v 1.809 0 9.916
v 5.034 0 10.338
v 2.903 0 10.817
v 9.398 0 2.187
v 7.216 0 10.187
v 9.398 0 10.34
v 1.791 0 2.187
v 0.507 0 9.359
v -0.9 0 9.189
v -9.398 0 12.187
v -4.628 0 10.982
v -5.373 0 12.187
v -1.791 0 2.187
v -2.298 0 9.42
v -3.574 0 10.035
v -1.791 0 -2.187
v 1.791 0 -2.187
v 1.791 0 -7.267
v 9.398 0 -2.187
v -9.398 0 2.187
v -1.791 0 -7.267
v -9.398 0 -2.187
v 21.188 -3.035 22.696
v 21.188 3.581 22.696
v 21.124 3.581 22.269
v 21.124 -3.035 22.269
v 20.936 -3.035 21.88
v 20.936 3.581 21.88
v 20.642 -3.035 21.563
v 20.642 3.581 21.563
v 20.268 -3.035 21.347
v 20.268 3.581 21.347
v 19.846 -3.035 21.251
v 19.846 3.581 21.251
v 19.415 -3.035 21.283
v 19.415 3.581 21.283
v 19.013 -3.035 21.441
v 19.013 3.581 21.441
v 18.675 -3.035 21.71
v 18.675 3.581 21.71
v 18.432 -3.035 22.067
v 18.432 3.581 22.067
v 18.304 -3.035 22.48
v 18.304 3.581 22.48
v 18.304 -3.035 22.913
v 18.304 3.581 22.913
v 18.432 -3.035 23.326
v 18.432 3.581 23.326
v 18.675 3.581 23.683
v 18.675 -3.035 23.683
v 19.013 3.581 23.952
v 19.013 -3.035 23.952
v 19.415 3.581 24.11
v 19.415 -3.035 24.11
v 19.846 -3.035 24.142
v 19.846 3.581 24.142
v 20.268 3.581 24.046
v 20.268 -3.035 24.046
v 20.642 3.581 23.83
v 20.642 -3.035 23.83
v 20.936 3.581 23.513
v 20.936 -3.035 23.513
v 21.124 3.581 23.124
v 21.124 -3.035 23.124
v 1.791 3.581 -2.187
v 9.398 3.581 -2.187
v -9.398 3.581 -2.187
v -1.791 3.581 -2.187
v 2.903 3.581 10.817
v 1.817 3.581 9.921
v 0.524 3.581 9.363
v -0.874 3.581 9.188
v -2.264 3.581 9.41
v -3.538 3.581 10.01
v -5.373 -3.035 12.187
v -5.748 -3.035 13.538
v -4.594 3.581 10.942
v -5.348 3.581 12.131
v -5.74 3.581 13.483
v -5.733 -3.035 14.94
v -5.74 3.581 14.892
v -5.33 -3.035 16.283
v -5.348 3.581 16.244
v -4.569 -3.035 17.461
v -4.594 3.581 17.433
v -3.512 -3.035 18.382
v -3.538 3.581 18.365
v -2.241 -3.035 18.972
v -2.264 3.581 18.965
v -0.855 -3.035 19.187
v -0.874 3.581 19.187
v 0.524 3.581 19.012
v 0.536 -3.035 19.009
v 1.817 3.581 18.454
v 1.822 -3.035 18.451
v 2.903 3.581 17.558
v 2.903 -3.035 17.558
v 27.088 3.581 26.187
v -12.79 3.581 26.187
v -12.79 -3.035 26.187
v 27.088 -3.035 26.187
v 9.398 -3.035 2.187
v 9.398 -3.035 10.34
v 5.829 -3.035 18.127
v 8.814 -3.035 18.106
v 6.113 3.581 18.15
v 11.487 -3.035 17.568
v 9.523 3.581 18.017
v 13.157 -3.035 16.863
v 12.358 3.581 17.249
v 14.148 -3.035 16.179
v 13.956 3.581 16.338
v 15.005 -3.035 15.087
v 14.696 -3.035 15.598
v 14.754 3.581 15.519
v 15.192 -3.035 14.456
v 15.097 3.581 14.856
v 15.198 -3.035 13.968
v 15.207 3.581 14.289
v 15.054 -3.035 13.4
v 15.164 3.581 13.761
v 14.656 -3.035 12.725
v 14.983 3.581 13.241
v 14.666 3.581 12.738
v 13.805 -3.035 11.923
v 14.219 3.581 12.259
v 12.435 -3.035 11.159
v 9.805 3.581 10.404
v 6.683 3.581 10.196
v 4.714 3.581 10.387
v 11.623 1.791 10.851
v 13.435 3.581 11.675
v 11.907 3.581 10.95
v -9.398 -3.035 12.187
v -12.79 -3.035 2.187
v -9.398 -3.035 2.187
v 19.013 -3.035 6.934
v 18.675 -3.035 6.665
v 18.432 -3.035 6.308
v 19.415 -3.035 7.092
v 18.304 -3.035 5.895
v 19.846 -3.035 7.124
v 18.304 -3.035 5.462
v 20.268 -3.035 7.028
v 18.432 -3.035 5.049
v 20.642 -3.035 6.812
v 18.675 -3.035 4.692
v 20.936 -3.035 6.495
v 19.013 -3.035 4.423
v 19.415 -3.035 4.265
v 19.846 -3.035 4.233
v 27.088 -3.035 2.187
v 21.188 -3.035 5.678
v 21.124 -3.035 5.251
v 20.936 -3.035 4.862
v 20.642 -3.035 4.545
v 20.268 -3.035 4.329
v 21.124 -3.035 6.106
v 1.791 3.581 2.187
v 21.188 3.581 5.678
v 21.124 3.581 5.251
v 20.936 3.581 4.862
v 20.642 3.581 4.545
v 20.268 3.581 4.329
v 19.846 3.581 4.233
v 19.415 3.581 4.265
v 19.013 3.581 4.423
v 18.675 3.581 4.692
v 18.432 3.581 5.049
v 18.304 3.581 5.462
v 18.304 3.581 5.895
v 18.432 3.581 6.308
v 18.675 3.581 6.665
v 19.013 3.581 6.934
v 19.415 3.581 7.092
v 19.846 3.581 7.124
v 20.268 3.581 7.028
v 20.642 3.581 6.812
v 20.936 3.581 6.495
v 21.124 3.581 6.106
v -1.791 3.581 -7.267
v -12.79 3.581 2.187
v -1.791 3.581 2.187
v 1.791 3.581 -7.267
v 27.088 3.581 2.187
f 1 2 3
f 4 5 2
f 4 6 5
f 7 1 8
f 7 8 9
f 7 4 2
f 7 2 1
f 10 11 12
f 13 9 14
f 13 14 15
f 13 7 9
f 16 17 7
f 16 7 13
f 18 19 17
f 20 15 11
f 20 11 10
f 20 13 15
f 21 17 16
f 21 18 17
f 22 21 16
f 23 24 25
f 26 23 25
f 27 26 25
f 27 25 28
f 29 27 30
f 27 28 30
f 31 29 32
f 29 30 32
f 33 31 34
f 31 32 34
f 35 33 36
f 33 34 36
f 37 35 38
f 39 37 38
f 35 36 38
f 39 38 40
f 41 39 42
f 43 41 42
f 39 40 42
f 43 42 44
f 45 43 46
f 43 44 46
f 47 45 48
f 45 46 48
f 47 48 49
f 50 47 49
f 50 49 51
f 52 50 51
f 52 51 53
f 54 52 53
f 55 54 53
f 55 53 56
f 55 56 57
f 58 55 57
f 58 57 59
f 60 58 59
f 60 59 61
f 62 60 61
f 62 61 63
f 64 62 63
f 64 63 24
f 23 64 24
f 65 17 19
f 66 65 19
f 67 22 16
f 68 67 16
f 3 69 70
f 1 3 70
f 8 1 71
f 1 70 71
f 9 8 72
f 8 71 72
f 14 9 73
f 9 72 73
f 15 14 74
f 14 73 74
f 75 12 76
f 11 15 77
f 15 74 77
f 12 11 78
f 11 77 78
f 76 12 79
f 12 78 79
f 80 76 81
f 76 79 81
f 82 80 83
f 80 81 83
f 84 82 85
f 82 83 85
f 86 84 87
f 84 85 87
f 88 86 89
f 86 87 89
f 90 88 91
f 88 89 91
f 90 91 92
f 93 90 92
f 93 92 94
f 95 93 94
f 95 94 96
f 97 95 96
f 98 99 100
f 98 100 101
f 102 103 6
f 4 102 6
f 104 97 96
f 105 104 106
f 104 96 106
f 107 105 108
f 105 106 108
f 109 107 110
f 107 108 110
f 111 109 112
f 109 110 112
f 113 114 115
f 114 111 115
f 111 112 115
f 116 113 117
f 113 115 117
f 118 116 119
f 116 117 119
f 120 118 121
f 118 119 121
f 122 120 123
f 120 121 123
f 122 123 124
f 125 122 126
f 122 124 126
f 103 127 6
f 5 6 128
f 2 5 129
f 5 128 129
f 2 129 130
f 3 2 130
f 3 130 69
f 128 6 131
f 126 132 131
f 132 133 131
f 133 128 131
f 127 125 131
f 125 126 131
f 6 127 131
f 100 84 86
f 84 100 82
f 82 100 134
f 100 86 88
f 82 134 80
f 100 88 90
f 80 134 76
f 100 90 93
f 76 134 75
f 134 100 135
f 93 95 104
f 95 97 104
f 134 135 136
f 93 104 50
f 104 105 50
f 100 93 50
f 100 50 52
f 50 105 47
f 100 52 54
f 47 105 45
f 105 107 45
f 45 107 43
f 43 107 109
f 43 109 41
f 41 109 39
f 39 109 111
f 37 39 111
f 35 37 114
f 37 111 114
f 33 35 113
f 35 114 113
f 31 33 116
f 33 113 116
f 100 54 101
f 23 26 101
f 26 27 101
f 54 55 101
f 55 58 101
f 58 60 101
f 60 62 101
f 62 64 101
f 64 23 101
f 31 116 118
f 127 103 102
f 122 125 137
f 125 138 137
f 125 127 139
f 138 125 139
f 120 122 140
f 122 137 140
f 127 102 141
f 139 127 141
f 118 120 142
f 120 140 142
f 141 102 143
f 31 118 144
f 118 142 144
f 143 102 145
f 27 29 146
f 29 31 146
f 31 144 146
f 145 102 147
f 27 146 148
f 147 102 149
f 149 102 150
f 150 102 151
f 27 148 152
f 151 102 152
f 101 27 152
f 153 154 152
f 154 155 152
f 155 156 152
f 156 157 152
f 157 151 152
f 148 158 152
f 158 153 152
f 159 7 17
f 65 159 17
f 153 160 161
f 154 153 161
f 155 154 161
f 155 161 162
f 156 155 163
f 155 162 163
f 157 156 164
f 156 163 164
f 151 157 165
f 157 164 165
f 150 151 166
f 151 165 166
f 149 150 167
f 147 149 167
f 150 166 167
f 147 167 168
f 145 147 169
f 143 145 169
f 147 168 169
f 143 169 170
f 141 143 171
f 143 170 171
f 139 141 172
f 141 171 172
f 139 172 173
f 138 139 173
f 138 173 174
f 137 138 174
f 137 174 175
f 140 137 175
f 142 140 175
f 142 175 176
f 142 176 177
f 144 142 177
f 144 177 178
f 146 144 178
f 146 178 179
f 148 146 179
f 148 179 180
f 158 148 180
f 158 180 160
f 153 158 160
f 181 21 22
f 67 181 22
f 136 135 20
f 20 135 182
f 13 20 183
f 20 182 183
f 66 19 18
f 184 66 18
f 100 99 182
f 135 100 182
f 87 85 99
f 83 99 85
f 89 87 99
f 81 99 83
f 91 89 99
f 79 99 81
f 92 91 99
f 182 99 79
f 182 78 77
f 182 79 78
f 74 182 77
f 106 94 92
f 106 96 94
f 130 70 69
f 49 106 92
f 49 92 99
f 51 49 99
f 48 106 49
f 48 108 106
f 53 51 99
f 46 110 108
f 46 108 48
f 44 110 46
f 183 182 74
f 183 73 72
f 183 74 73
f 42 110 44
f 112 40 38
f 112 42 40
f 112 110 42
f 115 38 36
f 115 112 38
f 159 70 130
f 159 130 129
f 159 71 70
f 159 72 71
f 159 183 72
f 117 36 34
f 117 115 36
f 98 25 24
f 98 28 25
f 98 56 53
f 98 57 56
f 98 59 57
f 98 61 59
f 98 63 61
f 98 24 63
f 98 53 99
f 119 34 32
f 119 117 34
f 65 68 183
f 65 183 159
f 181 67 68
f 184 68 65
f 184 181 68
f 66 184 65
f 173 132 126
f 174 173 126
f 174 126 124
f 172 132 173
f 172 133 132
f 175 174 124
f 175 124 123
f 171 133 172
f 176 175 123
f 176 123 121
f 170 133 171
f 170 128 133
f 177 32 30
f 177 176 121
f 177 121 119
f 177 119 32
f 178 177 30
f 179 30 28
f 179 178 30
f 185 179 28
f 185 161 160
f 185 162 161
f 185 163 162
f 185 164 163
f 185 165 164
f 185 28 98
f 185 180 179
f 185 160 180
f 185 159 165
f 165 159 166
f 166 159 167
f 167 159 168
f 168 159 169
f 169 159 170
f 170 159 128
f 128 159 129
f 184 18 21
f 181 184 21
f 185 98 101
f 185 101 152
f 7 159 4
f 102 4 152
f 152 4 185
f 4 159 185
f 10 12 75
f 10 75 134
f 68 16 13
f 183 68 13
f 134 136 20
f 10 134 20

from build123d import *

# Parameters (mm, degrees)
BOSS_EXTRUDE1_DEPTH      = 3.5814
SKETCH7_W                = 39.878
SKETCH7_H                = 24
BOSS_EXTRUDE2_DEPTH      = 3.035
BOSS_EXTRUDE2_DEPTH_BACK = 3.035
SKETCH5_R                = 5
SKETCH5_R_2              = 1.45
SKETCH5_RX               = 8
SKETCH5_RY               = 4
CUT_EXTRUDE3_DEPTH       = 1
CUT_EXTRUDE3_DEPTH_BACK  = 7.6164
SKETCH8_W                = 18.796
SKETCH8_H                = 3.035
CUT_EXTRUDE4_DEPTH       = 10


with BuildPart() as part:
    # Sketch1 → Boss-Extrude1 (new body)
    with BuildSketch(Plane(origin=(0, 0, 0), x_dir=(1, 0, 0), z_dir=(0, 1, 0))):
        Polygon((-12.79, -26.1874988), (27.088, -26.1874988), (27.088, -2.1874988), (1.7907, -2.1874988), (1.7907, 2.1874988), (9.398, 2.1874988), (1.7907, 7.2674988), (-1.7907, 7.2674988), (-9.398, 2.1874988), (-1.7907, 2.1874988), (-1.7907, -2.1874988), (-12.79, -2.1874988), align=None)
    extrude(amount=BOSS_EXTRUDE1_DEPTH)

    # Sketch7 → Boss-Extrude2 (add, two sides)
    with BuildSketch(Plane(origin=(0, 0, 0), x_dir=(1, 0, 0), z_dir=(0, 1, 0))) as boss_extrude2_sk:
        with Locations((7.149, -14.1874988)):
            Rectangle(SKETCH7_W, SKETCH7_H)
    extrude(amount=BOSS_EXTRUDE2_DEPTH)
    extrude(boss_extrude2_sk.sketch, amount=-BOSS_EXTRUDE2_DEPTH_BACK)

    # Sketch5 → Cut-Extrude3 (cut, two sides)
    with BuildSketch(Plane(origin=(0, 3.5814, 0), x_dir=(1, 0, 0), z_dir=(0, 1, 0))) as cut_extrude3_sk:
        with Locations((-0.79, -14.1874988)):
            Circle(SKETCH5_R)
        with Locations((19.738, -22.6964988)):
            Circle(SKETCH5_R_2)
        with Locations((19.738, -5.6784988)):
            Circle(SKETCH5_R_2)
        with Locations(Location((7.21, -14.1874988), (0, 0, 180))):
            Ellipse(SKETCH5_RX, SKETCH5_RY)
    extrude(amount=CUT_EXTRUDE3_DEPTH, mode=Mode.SUBTRACT)
    extrude(cut_extrude3_sk.sketch, amount=-CUT_EXTRUDE3_DEPTH_BACK, mode=Mode.SUBTRACT)

    # Sketch8 → Cut-Extrude4 (cut)
    with BuildSketch(Plane(origin=(0, 0, 2.1874988), x_dir=(-1, 0, 0), z_dir=(0, 0, -1))):
        with Locations((0, -1.5175)):
            Rectangle(SKETCH8_W, SKETCH8_H)
    extrude(amount=-CUT_EXTRUDE4_DEPTH, mode=Mode.SUBTRACT)


solid = part.part
